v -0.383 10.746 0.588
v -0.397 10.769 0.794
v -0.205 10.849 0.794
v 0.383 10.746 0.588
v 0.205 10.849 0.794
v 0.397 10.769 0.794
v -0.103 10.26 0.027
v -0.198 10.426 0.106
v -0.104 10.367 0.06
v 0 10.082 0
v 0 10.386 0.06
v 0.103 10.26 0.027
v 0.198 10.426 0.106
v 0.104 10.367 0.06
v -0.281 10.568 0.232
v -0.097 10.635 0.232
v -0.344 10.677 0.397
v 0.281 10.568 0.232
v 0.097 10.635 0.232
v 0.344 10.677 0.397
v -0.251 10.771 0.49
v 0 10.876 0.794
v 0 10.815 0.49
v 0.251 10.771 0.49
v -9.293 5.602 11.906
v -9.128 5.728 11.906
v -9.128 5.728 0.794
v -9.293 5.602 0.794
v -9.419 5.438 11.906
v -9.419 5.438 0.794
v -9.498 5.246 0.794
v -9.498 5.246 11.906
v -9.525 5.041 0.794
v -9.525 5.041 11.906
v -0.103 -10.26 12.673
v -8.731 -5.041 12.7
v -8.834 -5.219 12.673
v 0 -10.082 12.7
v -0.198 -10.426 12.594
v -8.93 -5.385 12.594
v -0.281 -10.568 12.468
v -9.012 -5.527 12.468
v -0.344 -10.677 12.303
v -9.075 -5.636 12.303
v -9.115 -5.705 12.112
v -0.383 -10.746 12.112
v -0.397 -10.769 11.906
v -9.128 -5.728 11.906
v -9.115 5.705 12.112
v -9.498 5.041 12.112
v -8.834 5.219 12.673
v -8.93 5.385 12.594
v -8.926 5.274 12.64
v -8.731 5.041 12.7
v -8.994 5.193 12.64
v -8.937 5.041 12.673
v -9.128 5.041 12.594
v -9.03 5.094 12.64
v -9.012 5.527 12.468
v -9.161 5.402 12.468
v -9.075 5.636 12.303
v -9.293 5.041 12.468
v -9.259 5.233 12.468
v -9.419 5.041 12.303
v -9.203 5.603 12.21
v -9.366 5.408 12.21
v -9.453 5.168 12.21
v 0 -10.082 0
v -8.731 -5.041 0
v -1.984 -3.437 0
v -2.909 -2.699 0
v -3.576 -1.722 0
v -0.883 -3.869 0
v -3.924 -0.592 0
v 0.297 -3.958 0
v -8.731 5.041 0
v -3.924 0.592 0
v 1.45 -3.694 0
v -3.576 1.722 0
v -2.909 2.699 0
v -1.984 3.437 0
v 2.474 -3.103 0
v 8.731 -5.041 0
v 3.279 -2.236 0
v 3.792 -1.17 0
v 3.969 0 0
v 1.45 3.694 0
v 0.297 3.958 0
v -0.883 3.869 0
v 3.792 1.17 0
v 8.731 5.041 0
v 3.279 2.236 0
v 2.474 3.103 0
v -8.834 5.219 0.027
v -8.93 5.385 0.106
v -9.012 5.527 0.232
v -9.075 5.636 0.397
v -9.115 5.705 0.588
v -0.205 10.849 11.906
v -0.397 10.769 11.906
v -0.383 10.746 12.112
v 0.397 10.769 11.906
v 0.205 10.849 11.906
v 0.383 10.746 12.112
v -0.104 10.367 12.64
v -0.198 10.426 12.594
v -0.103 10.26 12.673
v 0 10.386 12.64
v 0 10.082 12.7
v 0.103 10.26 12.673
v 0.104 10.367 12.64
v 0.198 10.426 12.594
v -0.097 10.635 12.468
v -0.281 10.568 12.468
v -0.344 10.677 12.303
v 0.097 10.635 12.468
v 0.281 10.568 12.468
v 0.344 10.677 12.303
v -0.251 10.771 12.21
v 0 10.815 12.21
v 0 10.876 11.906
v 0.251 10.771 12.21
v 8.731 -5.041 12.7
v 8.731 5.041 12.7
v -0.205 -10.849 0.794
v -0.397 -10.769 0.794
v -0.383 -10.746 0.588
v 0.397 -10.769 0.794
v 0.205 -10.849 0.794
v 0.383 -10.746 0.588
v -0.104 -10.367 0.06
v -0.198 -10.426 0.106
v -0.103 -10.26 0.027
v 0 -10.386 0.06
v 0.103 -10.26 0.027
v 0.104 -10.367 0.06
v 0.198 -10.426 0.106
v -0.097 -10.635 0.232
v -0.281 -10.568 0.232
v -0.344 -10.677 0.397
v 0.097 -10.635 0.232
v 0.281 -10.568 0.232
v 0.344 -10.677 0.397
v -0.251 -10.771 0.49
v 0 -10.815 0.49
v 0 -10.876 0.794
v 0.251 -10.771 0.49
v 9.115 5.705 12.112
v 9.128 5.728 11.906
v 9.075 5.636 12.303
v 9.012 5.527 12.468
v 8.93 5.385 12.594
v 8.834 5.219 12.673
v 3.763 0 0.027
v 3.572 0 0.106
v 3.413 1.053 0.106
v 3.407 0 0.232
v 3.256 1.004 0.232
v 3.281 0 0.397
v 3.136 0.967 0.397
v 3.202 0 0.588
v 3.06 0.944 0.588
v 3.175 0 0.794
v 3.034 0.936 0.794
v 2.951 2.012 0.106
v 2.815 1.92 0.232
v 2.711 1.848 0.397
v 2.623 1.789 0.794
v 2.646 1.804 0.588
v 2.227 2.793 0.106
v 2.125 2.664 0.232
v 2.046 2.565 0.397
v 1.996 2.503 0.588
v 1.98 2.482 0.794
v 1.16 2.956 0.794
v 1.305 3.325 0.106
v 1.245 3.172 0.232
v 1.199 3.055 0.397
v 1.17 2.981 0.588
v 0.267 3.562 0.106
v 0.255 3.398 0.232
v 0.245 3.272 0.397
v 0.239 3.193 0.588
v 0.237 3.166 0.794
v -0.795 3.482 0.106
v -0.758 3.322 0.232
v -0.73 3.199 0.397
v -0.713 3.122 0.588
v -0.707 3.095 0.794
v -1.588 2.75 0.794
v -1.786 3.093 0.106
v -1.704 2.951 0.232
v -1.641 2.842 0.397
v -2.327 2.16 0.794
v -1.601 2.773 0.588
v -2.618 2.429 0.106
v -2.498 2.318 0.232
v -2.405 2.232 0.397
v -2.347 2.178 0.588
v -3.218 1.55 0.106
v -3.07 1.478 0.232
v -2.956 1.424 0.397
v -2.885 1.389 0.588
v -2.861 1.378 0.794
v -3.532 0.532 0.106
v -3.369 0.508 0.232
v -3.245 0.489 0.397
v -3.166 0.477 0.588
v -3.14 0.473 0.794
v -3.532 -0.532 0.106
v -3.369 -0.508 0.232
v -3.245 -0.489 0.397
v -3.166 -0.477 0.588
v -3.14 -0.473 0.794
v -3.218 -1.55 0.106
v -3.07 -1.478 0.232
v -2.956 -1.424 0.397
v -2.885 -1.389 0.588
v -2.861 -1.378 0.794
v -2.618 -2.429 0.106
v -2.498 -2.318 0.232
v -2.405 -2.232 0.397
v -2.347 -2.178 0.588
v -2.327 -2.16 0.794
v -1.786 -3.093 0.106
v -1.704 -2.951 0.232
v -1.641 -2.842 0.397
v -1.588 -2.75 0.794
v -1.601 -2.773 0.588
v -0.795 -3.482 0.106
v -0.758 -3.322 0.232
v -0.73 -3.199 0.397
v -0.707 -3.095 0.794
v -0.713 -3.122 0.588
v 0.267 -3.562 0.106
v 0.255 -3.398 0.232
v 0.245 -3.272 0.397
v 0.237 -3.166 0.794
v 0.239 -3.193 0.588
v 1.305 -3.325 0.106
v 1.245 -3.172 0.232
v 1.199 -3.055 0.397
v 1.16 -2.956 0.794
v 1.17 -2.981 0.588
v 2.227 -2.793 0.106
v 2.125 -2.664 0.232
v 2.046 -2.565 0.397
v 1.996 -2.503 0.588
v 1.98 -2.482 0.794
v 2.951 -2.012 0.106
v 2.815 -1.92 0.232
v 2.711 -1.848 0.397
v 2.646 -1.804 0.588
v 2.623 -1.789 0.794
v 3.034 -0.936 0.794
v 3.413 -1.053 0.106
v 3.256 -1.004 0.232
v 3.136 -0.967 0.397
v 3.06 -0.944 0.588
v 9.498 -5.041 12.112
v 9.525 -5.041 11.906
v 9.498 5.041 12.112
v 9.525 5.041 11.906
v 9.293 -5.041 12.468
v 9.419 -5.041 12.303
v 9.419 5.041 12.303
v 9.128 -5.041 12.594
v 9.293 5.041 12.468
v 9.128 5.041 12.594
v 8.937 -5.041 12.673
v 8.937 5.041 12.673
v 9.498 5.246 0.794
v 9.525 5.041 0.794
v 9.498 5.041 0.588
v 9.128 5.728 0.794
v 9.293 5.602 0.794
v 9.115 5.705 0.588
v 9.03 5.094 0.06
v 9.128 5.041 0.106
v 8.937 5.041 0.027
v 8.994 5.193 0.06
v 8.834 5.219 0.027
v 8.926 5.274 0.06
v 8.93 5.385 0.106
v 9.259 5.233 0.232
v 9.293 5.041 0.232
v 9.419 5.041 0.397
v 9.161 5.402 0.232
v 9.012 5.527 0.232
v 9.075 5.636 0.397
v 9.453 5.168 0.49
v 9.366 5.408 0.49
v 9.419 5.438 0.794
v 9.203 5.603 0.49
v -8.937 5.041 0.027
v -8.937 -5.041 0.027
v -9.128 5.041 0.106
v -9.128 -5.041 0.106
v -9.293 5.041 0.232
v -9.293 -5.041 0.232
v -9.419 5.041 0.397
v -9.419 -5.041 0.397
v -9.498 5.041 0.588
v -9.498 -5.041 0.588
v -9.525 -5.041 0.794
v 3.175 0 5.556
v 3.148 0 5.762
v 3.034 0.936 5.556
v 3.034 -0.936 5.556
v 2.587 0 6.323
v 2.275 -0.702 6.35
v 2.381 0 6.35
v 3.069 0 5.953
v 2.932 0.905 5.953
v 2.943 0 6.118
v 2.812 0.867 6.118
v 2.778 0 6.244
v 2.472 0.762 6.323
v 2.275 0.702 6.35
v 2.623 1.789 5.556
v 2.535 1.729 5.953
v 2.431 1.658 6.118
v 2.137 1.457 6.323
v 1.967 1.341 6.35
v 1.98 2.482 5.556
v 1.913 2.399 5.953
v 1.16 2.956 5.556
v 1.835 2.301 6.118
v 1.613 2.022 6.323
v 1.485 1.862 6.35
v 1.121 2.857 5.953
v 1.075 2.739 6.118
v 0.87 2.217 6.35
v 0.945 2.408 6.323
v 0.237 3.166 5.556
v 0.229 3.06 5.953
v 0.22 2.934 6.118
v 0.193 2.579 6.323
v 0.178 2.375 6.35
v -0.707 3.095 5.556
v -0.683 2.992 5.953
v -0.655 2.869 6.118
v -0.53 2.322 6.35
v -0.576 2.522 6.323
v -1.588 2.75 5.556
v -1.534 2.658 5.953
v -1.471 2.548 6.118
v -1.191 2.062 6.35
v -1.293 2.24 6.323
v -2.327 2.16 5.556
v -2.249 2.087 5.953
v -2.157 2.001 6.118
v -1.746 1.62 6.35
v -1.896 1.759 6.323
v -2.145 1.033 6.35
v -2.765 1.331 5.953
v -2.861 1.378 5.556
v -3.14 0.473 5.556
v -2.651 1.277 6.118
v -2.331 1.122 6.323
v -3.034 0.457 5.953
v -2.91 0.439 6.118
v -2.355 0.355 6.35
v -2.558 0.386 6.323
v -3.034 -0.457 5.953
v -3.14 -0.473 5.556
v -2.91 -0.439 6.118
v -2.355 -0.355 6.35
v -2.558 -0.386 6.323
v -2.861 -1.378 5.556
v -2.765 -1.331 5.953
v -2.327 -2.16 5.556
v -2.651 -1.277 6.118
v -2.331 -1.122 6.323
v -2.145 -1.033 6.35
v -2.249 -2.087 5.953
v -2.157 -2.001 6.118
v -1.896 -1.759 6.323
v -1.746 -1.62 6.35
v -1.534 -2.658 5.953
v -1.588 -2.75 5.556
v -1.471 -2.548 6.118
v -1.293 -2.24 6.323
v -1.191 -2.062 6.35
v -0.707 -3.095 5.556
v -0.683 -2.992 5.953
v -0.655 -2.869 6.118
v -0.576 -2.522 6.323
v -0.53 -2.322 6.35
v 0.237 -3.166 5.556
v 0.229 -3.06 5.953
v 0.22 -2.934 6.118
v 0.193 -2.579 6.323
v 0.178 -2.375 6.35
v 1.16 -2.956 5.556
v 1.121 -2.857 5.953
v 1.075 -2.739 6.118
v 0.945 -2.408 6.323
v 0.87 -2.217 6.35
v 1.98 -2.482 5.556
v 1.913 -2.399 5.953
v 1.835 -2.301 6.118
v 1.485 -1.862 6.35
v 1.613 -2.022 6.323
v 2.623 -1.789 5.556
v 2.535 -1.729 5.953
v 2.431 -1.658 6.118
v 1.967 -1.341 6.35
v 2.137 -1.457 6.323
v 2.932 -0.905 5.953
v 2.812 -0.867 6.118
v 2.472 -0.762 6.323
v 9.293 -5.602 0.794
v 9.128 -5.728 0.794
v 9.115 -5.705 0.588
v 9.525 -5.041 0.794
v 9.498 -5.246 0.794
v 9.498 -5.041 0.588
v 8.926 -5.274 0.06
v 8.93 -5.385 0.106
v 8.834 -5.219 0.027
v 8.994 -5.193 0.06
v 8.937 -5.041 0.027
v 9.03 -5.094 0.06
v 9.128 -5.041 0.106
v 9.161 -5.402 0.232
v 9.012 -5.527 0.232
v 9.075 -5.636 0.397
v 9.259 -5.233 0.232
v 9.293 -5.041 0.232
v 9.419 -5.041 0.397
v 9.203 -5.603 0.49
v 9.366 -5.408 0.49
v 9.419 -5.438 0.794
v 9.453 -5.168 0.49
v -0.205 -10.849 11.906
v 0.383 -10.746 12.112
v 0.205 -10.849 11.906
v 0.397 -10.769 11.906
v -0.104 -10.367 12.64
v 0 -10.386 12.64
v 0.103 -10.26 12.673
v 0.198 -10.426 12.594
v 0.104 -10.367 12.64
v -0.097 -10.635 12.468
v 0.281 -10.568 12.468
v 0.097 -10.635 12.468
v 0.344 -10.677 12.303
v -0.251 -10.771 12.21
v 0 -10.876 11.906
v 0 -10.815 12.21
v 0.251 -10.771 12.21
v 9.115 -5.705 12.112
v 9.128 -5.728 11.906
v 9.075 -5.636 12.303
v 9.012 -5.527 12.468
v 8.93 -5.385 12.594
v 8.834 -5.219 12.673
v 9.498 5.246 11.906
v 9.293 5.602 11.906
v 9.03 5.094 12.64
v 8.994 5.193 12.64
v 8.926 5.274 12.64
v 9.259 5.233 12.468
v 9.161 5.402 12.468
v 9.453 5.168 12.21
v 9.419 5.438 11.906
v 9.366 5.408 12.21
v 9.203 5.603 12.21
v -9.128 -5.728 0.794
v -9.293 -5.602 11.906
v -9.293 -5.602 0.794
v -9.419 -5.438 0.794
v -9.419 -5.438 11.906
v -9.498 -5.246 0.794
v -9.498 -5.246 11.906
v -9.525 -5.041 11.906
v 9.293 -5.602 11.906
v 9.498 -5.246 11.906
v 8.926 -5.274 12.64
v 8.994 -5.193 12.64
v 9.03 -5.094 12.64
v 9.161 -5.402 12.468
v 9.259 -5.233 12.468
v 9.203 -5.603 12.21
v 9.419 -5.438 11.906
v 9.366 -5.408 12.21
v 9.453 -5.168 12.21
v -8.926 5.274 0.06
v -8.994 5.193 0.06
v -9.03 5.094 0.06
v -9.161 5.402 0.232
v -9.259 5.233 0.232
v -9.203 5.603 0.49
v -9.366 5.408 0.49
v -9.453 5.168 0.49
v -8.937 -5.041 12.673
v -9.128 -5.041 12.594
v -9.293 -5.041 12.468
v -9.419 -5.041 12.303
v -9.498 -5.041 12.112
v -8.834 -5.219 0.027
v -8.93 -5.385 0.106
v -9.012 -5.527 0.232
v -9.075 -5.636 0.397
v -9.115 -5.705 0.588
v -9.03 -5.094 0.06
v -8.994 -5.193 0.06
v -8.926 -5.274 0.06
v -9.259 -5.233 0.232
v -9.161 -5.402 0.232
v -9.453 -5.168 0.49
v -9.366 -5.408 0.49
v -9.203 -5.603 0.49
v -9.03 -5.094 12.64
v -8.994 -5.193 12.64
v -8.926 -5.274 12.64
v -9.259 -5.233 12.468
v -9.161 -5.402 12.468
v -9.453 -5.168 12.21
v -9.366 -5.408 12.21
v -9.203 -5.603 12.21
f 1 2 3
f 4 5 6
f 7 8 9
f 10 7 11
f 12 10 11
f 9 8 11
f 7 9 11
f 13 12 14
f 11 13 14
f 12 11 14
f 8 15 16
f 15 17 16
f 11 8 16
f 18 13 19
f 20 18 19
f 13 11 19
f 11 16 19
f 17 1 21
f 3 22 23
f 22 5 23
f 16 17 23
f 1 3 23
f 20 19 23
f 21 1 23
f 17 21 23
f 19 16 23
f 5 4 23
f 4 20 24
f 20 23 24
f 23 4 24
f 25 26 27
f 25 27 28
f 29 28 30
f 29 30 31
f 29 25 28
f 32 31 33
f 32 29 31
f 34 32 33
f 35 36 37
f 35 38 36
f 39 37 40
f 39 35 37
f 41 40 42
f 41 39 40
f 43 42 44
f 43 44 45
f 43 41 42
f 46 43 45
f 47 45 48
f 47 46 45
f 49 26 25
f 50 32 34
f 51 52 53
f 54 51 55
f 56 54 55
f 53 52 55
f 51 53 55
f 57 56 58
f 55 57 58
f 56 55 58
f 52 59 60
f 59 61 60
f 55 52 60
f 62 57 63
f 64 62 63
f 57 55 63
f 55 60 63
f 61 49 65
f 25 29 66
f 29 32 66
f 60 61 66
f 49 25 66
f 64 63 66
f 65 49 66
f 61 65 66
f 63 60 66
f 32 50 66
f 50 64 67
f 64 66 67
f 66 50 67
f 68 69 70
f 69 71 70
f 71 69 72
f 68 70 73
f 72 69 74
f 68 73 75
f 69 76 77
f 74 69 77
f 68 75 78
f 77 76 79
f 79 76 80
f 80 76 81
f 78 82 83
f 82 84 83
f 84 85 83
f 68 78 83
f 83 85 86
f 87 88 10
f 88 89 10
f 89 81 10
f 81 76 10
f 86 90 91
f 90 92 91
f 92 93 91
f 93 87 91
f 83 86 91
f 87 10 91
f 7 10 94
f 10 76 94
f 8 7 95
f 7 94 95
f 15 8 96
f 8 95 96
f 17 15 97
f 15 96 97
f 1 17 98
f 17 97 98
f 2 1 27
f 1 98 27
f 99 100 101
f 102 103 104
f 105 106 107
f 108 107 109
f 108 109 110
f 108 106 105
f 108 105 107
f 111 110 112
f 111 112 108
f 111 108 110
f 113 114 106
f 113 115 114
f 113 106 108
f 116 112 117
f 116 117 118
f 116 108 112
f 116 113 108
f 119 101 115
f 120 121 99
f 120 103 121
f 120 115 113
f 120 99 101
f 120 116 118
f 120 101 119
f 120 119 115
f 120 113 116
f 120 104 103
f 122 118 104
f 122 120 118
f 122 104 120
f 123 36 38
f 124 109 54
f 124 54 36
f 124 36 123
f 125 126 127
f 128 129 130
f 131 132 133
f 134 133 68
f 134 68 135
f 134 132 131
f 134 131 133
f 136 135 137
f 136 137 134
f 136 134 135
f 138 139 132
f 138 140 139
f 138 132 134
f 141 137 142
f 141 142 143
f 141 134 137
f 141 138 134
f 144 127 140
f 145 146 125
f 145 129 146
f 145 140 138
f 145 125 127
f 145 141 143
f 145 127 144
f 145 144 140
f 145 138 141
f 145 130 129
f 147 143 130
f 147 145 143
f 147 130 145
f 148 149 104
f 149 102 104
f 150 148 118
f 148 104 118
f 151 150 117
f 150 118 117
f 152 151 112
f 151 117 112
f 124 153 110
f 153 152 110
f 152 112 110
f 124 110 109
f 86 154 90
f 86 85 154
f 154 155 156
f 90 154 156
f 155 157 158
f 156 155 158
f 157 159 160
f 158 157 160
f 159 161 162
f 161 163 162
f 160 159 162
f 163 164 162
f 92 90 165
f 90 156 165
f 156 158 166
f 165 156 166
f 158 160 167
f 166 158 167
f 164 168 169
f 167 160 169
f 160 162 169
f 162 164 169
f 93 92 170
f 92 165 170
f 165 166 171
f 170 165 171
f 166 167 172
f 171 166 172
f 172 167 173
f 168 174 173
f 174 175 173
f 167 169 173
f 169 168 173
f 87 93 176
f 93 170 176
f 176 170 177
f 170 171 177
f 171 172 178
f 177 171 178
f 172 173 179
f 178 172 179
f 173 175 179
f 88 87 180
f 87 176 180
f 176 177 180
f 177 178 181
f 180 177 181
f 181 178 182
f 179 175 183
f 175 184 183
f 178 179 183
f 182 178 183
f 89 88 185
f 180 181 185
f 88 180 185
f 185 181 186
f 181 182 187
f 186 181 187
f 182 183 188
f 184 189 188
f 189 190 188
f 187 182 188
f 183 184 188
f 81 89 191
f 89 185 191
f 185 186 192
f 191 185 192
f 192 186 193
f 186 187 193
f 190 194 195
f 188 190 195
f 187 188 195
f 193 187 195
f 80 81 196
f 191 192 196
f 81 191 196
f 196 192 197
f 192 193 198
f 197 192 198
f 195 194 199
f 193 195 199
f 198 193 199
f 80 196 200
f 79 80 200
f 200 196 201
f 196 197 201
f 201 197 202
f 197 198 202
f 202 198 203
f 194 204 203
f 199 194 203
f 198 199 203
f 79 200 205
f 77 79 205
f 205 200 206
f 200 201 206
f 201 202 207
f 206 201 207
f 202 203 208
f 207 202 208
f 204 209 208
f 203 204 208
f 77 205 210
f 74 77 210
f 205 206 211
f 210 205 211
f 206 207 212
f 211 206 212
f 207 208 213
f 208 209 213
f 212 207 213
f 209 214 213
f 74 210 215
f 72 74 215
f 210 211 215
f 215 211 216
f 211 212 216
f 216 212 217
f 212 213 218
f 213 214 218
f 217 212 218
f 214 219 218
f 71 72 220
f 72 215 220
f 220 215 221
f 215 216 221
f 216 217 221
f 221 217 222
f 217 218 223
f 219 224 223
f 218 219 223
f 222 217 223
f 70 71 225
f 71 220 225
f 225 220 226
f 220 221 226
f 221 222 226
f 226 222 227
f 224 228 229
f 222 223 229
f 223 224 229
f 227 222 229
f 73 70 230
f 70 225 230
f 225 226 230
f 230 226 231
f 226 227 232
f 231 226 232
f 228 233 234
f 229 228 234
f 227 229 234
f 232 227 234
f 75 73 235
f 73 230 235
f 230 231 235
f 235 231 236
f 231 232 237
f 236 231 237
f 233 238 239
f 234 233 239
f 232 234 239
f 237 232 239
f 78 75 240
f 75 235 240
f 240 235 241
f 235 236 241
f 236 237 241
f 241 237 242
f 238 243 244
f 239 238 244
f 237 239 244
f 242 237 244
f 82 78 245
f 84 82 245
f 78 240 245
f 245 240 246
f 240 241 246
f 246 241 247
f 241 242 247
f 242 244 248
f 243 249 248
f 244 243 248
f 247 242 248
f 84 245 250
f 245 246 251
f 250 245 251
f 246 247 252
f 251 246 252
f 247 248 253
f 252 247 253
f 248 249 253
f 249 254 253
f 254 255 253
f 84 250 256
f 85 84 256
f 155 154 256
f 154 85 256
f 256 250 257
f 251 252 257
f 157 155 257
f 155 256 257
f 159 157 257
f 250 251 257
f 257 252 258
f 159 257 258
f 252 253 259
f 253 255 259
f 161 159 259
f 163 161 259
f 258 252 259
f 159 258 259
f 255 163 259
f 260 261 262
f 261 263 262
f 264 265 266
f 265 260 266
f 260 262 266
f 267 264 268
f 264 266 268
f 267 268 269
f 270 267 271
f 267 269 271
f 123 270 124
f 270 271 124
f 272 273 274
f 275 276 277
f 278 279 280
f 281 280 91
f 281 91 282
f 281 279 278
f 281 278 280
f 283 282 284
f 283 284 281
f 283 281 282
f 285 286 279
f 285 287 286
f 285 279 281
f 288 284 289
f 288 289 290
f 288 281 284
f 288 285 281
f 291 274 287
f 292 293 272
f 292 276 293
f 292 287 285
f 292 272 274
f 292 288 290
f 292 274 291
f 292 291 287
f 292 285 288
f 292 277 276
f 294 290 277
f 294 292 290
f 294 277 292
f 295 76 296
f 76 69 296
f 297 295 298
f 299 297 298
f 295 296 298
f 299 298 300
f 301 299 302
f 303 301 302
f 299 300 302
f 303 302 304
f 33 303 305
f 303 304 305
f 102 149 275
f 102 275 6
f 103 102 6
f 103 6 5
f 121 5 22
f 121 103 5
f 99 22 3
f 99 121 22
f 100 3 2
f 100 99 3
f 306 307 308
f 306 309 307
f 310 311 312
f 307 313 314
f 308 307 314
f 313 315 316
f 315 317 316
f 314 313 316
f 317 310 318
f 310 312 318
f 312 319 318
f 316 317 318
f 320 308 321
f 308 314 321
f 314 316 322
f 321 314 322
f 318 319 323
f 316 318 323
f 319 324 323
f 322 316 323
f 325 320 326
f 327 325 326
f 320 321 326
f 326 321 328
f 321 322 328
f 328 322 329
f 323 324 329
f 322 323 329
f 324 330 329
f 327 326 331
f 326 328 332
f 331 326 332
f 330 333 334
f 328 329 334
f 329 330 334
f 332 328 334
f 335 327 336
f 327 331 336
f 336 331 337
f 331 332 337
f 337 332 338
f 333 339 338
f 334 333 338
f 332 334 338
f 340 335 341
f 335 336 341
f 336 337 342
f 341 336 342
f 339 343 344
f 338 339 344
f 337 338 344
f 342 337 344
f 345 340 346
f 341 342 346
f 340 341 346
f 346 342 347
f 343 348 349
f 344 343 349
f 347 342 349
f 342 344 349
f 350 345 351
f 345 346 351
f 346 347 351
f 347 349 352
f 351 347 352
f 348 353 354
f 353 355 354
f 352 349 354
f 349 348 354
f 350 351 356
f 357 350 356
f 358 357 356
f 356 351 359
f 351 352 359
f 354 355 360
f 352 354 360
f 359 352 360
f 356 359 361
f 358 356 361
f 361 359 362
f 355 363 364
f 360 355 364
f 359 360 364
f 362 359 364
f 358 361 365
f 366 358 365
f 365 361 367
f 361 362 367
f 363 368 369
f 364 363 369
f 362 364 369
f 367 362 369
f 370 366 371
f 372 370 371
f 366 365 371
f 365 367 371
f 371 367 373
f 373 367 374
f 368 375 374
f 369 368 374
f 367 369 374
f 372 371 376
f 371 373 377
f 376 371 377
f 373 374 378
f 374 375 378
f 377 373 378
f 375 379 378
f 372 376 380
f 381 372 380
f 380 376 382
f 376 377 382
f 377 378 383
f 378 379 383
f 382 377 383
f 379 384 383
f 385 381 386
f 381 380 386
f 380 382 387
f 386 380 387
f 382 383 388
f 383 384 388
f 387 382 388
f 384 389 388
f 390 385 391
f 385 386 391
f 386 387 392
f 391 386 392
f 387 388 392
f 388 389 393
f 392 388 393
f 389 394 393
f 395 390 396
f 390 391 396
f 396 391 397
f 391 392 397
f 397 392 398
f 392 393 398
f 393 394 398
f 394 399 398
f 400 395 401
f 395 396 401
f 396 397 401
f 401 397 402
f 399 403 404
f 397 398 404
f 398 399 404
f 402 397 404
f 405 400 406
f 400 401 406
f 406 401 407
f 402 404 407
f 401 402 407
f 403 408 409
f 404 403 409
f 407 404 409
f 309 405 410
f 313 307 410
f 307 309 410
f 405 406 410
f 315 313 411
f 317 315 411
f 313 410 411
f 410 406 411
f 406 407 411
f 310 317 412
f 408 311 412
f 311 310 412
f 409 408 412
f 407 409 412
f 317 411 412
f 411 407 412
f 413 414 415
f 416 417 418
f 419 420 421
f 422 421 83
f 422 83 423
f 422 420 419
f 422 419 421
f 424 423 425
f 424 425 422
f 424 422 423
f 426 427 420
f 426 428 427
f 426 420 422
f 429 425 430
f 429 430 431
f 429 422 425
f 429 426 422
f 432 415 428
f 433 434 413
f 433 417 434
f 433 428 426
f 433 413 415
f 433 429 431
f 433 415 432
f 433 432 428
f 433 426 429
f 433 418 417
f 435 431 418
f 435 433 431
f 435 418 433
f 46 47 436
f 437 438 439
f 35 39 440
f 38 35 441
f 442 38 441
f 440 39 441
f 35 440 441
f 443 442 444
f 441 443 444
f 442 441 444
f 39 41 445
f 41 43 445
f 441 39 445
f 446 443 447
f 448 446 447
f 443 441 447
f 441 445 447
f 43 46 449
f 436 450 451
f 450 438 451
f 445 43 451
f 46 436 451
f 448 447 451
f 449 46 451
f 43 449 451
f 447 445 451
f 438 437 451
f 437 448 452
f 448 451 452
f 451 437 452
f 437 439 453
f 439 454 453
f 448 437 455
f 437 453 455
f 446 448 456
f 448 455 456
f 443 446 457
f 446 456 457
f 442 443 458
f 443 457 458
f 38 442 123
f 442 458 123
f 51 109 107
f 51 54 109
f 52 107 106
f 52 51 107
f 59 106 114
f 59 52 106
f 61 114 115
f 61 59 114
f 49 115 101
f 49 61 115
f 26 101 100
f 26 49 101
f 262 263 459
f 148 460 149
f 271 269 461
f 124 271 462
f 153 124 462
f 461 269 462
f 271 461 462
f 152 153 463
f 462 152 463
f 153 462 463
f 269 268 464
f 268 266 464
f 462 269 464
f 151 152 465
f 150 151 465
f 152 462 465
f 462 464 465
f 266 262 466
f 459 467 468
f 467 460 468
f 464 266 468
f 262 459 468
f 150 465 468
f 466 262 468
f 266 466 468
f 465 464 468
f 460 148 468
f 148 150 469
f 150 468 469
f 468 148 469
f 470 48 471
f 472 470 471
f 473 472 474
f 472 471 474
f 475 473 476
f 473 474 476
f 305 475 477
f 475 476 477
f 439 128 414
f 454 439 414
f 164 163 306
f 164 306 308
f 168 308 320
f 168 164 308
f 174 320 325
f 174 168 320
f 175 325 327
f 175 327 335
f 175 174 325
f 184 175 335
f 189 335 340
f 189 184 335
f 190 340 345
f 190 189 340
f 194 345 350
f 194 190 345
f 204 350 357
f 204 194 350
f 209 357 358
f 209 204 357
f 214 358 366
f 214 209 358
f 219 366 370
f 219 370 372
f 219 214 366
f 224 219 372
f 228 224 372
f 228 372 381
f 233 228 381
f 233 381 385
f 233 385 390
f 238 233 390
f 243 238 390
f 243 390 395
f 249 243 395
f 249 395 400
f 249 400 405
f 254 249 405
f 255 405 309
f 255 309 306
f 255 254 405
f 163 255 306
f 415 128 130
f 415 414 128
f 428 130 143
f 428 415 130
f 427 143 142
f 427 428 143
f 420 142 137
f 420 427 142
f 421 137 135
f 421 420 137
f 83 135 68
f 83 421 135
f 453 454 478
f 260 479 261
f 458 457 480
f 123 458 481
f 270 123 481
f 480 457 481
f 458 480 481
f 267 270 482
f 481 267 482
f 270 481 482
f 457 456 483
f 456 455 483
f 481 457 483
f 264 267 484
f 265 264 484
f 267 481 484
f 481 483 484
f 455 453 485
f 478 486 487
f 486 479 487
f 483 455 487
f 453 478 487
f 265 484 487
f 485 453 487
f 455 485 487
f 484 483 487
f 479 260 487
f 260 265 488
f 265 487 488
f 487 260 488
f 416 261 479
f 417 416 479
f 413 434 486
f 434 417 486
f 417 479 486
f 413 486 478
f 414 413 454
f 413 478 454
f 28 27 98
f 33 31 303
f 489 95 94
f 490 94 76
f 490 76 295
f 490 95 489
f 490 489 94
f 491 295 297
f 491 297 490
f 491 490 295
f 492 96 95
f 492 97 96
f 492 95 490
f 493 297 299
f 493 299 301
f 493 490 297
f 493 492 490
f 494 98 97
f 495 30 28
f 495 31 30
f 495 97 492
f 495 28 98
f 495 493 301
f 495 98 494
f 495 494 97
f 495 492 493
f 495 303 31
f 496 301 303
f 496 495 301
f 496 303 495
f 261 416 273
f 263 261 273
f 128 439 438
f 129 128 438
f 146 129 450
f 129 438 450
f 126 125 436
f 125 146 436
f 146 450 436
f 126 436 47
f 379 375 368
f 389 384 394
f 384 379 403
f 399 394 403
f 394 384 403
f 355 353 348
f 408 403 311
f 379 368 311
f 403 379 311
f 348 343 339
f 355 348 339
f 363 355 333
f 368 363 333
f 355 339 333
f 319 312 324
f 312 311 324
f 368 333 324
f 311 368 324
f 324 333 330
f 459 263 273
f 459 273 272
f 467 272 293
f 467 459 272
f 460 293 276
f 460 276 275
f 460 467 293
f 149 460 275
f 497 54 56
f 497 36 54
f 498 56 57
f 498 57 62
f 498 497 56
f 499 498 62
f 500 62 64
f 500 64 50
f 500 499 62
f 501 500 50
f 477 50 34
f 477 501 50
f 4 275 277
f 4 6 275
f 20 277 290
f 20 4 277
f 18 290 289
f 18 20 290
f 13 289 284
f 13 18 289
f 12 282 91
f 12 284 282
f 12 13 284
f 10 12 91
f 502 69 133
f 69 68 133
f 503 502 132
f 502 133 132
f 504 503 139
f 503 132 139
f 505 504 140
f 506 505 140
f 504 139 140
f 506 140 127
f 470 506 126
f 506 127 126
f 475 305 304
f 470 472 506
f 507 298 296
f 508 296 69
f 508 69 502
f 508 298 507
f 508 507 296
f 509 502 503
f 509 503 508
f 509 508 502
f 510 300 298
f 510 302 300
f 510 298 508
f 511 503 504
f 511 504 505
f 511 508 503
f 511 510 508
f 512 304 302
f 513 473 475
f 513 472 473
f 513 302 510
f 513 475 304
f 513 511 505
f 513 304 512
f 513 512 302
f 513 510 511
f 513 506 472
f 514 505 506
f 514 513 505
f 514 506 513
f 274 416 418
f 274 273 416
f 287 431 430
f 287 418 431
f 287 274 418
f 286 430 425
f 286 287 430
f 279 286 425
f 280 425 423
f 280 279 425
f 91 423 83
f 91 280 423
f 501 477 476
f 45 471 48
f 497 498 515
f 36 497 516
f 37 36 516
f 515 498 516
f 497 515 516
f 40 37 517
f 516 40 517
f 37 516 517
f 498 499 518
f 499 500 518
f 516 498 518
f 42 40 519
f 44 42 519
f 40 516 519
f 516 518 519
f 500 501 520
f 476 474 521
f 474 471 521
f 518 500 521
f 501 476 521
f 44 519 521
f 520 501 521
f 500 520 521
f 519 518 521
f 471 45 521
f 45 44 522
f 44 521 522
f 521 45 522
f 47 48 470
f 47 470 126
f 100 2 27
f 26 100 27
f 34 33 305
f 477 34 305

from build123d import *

# Parameters (mm, degrees)
F0_R     = 3.175
F1_DEPTH = 12.7
F2_DEPTH = 6.35
F3_R     = 0.79375


with BuildPart() as f1:
    # F0 (on Top) → F1 (new body)
    with BuildSketch(Plane.XY):
        Polygon((9.525, -5.499261314), (9.525, 5.499261314), (0, 10.9985226281), (-9.525, 5.499261314), (-9.525, -5.499261314), (0, -10.9985226281), align=None)
        Circle(F0_R, mode=Mode.SUBTRACT)
        Circle(F0_R)
    extrude(amount=F1_DEPTH)

    # F0 (on Top) → F2 (cut)
    with BuildSketch(Plane.XY):
        Circle(F0_R)
    extrude(amount=F2_DEPTH, mode=Mode.SUBTRACT)

    # F3
    f3_edges = [f1.edges().sort_by_distance(p)[0] for p in [
        (0, 10.998523, 6.35),
        (-9.525, 5.499261, 6.35),
        (-4.7625, 8.248892, 0),
        (-4.7625, 8.248892, 12.7),
        (-9.525, -5.499261, 6.35),
        (-9.525, 0, 0),
        (-9.525, 0, 12.7),
        (0, -10.998523, 6.35),
        (-4.7625, -8.248892, 0),
        (-4.7625, -8.248892, 12.7),
        (9.525, -5.499261, 6.35),
        (4.7625, -8.248892, 0),
        (4.7625, -8.248892, 12.7),
        (9.525, 0, 12.7),
        (4.7625, 8.248892, 12.7),
        (9.525, 5.499261, 6.35),
        (9.525, 0, 0),
        (4.7625, 8.248892, 0),
        (3.175, 0, 3.175),
        (-3.175, 0, 0),
        (-3.175, 0, 6.35),
    ]]
    fillet(f3_edges, radius=F3_R)


solid = f1.part
